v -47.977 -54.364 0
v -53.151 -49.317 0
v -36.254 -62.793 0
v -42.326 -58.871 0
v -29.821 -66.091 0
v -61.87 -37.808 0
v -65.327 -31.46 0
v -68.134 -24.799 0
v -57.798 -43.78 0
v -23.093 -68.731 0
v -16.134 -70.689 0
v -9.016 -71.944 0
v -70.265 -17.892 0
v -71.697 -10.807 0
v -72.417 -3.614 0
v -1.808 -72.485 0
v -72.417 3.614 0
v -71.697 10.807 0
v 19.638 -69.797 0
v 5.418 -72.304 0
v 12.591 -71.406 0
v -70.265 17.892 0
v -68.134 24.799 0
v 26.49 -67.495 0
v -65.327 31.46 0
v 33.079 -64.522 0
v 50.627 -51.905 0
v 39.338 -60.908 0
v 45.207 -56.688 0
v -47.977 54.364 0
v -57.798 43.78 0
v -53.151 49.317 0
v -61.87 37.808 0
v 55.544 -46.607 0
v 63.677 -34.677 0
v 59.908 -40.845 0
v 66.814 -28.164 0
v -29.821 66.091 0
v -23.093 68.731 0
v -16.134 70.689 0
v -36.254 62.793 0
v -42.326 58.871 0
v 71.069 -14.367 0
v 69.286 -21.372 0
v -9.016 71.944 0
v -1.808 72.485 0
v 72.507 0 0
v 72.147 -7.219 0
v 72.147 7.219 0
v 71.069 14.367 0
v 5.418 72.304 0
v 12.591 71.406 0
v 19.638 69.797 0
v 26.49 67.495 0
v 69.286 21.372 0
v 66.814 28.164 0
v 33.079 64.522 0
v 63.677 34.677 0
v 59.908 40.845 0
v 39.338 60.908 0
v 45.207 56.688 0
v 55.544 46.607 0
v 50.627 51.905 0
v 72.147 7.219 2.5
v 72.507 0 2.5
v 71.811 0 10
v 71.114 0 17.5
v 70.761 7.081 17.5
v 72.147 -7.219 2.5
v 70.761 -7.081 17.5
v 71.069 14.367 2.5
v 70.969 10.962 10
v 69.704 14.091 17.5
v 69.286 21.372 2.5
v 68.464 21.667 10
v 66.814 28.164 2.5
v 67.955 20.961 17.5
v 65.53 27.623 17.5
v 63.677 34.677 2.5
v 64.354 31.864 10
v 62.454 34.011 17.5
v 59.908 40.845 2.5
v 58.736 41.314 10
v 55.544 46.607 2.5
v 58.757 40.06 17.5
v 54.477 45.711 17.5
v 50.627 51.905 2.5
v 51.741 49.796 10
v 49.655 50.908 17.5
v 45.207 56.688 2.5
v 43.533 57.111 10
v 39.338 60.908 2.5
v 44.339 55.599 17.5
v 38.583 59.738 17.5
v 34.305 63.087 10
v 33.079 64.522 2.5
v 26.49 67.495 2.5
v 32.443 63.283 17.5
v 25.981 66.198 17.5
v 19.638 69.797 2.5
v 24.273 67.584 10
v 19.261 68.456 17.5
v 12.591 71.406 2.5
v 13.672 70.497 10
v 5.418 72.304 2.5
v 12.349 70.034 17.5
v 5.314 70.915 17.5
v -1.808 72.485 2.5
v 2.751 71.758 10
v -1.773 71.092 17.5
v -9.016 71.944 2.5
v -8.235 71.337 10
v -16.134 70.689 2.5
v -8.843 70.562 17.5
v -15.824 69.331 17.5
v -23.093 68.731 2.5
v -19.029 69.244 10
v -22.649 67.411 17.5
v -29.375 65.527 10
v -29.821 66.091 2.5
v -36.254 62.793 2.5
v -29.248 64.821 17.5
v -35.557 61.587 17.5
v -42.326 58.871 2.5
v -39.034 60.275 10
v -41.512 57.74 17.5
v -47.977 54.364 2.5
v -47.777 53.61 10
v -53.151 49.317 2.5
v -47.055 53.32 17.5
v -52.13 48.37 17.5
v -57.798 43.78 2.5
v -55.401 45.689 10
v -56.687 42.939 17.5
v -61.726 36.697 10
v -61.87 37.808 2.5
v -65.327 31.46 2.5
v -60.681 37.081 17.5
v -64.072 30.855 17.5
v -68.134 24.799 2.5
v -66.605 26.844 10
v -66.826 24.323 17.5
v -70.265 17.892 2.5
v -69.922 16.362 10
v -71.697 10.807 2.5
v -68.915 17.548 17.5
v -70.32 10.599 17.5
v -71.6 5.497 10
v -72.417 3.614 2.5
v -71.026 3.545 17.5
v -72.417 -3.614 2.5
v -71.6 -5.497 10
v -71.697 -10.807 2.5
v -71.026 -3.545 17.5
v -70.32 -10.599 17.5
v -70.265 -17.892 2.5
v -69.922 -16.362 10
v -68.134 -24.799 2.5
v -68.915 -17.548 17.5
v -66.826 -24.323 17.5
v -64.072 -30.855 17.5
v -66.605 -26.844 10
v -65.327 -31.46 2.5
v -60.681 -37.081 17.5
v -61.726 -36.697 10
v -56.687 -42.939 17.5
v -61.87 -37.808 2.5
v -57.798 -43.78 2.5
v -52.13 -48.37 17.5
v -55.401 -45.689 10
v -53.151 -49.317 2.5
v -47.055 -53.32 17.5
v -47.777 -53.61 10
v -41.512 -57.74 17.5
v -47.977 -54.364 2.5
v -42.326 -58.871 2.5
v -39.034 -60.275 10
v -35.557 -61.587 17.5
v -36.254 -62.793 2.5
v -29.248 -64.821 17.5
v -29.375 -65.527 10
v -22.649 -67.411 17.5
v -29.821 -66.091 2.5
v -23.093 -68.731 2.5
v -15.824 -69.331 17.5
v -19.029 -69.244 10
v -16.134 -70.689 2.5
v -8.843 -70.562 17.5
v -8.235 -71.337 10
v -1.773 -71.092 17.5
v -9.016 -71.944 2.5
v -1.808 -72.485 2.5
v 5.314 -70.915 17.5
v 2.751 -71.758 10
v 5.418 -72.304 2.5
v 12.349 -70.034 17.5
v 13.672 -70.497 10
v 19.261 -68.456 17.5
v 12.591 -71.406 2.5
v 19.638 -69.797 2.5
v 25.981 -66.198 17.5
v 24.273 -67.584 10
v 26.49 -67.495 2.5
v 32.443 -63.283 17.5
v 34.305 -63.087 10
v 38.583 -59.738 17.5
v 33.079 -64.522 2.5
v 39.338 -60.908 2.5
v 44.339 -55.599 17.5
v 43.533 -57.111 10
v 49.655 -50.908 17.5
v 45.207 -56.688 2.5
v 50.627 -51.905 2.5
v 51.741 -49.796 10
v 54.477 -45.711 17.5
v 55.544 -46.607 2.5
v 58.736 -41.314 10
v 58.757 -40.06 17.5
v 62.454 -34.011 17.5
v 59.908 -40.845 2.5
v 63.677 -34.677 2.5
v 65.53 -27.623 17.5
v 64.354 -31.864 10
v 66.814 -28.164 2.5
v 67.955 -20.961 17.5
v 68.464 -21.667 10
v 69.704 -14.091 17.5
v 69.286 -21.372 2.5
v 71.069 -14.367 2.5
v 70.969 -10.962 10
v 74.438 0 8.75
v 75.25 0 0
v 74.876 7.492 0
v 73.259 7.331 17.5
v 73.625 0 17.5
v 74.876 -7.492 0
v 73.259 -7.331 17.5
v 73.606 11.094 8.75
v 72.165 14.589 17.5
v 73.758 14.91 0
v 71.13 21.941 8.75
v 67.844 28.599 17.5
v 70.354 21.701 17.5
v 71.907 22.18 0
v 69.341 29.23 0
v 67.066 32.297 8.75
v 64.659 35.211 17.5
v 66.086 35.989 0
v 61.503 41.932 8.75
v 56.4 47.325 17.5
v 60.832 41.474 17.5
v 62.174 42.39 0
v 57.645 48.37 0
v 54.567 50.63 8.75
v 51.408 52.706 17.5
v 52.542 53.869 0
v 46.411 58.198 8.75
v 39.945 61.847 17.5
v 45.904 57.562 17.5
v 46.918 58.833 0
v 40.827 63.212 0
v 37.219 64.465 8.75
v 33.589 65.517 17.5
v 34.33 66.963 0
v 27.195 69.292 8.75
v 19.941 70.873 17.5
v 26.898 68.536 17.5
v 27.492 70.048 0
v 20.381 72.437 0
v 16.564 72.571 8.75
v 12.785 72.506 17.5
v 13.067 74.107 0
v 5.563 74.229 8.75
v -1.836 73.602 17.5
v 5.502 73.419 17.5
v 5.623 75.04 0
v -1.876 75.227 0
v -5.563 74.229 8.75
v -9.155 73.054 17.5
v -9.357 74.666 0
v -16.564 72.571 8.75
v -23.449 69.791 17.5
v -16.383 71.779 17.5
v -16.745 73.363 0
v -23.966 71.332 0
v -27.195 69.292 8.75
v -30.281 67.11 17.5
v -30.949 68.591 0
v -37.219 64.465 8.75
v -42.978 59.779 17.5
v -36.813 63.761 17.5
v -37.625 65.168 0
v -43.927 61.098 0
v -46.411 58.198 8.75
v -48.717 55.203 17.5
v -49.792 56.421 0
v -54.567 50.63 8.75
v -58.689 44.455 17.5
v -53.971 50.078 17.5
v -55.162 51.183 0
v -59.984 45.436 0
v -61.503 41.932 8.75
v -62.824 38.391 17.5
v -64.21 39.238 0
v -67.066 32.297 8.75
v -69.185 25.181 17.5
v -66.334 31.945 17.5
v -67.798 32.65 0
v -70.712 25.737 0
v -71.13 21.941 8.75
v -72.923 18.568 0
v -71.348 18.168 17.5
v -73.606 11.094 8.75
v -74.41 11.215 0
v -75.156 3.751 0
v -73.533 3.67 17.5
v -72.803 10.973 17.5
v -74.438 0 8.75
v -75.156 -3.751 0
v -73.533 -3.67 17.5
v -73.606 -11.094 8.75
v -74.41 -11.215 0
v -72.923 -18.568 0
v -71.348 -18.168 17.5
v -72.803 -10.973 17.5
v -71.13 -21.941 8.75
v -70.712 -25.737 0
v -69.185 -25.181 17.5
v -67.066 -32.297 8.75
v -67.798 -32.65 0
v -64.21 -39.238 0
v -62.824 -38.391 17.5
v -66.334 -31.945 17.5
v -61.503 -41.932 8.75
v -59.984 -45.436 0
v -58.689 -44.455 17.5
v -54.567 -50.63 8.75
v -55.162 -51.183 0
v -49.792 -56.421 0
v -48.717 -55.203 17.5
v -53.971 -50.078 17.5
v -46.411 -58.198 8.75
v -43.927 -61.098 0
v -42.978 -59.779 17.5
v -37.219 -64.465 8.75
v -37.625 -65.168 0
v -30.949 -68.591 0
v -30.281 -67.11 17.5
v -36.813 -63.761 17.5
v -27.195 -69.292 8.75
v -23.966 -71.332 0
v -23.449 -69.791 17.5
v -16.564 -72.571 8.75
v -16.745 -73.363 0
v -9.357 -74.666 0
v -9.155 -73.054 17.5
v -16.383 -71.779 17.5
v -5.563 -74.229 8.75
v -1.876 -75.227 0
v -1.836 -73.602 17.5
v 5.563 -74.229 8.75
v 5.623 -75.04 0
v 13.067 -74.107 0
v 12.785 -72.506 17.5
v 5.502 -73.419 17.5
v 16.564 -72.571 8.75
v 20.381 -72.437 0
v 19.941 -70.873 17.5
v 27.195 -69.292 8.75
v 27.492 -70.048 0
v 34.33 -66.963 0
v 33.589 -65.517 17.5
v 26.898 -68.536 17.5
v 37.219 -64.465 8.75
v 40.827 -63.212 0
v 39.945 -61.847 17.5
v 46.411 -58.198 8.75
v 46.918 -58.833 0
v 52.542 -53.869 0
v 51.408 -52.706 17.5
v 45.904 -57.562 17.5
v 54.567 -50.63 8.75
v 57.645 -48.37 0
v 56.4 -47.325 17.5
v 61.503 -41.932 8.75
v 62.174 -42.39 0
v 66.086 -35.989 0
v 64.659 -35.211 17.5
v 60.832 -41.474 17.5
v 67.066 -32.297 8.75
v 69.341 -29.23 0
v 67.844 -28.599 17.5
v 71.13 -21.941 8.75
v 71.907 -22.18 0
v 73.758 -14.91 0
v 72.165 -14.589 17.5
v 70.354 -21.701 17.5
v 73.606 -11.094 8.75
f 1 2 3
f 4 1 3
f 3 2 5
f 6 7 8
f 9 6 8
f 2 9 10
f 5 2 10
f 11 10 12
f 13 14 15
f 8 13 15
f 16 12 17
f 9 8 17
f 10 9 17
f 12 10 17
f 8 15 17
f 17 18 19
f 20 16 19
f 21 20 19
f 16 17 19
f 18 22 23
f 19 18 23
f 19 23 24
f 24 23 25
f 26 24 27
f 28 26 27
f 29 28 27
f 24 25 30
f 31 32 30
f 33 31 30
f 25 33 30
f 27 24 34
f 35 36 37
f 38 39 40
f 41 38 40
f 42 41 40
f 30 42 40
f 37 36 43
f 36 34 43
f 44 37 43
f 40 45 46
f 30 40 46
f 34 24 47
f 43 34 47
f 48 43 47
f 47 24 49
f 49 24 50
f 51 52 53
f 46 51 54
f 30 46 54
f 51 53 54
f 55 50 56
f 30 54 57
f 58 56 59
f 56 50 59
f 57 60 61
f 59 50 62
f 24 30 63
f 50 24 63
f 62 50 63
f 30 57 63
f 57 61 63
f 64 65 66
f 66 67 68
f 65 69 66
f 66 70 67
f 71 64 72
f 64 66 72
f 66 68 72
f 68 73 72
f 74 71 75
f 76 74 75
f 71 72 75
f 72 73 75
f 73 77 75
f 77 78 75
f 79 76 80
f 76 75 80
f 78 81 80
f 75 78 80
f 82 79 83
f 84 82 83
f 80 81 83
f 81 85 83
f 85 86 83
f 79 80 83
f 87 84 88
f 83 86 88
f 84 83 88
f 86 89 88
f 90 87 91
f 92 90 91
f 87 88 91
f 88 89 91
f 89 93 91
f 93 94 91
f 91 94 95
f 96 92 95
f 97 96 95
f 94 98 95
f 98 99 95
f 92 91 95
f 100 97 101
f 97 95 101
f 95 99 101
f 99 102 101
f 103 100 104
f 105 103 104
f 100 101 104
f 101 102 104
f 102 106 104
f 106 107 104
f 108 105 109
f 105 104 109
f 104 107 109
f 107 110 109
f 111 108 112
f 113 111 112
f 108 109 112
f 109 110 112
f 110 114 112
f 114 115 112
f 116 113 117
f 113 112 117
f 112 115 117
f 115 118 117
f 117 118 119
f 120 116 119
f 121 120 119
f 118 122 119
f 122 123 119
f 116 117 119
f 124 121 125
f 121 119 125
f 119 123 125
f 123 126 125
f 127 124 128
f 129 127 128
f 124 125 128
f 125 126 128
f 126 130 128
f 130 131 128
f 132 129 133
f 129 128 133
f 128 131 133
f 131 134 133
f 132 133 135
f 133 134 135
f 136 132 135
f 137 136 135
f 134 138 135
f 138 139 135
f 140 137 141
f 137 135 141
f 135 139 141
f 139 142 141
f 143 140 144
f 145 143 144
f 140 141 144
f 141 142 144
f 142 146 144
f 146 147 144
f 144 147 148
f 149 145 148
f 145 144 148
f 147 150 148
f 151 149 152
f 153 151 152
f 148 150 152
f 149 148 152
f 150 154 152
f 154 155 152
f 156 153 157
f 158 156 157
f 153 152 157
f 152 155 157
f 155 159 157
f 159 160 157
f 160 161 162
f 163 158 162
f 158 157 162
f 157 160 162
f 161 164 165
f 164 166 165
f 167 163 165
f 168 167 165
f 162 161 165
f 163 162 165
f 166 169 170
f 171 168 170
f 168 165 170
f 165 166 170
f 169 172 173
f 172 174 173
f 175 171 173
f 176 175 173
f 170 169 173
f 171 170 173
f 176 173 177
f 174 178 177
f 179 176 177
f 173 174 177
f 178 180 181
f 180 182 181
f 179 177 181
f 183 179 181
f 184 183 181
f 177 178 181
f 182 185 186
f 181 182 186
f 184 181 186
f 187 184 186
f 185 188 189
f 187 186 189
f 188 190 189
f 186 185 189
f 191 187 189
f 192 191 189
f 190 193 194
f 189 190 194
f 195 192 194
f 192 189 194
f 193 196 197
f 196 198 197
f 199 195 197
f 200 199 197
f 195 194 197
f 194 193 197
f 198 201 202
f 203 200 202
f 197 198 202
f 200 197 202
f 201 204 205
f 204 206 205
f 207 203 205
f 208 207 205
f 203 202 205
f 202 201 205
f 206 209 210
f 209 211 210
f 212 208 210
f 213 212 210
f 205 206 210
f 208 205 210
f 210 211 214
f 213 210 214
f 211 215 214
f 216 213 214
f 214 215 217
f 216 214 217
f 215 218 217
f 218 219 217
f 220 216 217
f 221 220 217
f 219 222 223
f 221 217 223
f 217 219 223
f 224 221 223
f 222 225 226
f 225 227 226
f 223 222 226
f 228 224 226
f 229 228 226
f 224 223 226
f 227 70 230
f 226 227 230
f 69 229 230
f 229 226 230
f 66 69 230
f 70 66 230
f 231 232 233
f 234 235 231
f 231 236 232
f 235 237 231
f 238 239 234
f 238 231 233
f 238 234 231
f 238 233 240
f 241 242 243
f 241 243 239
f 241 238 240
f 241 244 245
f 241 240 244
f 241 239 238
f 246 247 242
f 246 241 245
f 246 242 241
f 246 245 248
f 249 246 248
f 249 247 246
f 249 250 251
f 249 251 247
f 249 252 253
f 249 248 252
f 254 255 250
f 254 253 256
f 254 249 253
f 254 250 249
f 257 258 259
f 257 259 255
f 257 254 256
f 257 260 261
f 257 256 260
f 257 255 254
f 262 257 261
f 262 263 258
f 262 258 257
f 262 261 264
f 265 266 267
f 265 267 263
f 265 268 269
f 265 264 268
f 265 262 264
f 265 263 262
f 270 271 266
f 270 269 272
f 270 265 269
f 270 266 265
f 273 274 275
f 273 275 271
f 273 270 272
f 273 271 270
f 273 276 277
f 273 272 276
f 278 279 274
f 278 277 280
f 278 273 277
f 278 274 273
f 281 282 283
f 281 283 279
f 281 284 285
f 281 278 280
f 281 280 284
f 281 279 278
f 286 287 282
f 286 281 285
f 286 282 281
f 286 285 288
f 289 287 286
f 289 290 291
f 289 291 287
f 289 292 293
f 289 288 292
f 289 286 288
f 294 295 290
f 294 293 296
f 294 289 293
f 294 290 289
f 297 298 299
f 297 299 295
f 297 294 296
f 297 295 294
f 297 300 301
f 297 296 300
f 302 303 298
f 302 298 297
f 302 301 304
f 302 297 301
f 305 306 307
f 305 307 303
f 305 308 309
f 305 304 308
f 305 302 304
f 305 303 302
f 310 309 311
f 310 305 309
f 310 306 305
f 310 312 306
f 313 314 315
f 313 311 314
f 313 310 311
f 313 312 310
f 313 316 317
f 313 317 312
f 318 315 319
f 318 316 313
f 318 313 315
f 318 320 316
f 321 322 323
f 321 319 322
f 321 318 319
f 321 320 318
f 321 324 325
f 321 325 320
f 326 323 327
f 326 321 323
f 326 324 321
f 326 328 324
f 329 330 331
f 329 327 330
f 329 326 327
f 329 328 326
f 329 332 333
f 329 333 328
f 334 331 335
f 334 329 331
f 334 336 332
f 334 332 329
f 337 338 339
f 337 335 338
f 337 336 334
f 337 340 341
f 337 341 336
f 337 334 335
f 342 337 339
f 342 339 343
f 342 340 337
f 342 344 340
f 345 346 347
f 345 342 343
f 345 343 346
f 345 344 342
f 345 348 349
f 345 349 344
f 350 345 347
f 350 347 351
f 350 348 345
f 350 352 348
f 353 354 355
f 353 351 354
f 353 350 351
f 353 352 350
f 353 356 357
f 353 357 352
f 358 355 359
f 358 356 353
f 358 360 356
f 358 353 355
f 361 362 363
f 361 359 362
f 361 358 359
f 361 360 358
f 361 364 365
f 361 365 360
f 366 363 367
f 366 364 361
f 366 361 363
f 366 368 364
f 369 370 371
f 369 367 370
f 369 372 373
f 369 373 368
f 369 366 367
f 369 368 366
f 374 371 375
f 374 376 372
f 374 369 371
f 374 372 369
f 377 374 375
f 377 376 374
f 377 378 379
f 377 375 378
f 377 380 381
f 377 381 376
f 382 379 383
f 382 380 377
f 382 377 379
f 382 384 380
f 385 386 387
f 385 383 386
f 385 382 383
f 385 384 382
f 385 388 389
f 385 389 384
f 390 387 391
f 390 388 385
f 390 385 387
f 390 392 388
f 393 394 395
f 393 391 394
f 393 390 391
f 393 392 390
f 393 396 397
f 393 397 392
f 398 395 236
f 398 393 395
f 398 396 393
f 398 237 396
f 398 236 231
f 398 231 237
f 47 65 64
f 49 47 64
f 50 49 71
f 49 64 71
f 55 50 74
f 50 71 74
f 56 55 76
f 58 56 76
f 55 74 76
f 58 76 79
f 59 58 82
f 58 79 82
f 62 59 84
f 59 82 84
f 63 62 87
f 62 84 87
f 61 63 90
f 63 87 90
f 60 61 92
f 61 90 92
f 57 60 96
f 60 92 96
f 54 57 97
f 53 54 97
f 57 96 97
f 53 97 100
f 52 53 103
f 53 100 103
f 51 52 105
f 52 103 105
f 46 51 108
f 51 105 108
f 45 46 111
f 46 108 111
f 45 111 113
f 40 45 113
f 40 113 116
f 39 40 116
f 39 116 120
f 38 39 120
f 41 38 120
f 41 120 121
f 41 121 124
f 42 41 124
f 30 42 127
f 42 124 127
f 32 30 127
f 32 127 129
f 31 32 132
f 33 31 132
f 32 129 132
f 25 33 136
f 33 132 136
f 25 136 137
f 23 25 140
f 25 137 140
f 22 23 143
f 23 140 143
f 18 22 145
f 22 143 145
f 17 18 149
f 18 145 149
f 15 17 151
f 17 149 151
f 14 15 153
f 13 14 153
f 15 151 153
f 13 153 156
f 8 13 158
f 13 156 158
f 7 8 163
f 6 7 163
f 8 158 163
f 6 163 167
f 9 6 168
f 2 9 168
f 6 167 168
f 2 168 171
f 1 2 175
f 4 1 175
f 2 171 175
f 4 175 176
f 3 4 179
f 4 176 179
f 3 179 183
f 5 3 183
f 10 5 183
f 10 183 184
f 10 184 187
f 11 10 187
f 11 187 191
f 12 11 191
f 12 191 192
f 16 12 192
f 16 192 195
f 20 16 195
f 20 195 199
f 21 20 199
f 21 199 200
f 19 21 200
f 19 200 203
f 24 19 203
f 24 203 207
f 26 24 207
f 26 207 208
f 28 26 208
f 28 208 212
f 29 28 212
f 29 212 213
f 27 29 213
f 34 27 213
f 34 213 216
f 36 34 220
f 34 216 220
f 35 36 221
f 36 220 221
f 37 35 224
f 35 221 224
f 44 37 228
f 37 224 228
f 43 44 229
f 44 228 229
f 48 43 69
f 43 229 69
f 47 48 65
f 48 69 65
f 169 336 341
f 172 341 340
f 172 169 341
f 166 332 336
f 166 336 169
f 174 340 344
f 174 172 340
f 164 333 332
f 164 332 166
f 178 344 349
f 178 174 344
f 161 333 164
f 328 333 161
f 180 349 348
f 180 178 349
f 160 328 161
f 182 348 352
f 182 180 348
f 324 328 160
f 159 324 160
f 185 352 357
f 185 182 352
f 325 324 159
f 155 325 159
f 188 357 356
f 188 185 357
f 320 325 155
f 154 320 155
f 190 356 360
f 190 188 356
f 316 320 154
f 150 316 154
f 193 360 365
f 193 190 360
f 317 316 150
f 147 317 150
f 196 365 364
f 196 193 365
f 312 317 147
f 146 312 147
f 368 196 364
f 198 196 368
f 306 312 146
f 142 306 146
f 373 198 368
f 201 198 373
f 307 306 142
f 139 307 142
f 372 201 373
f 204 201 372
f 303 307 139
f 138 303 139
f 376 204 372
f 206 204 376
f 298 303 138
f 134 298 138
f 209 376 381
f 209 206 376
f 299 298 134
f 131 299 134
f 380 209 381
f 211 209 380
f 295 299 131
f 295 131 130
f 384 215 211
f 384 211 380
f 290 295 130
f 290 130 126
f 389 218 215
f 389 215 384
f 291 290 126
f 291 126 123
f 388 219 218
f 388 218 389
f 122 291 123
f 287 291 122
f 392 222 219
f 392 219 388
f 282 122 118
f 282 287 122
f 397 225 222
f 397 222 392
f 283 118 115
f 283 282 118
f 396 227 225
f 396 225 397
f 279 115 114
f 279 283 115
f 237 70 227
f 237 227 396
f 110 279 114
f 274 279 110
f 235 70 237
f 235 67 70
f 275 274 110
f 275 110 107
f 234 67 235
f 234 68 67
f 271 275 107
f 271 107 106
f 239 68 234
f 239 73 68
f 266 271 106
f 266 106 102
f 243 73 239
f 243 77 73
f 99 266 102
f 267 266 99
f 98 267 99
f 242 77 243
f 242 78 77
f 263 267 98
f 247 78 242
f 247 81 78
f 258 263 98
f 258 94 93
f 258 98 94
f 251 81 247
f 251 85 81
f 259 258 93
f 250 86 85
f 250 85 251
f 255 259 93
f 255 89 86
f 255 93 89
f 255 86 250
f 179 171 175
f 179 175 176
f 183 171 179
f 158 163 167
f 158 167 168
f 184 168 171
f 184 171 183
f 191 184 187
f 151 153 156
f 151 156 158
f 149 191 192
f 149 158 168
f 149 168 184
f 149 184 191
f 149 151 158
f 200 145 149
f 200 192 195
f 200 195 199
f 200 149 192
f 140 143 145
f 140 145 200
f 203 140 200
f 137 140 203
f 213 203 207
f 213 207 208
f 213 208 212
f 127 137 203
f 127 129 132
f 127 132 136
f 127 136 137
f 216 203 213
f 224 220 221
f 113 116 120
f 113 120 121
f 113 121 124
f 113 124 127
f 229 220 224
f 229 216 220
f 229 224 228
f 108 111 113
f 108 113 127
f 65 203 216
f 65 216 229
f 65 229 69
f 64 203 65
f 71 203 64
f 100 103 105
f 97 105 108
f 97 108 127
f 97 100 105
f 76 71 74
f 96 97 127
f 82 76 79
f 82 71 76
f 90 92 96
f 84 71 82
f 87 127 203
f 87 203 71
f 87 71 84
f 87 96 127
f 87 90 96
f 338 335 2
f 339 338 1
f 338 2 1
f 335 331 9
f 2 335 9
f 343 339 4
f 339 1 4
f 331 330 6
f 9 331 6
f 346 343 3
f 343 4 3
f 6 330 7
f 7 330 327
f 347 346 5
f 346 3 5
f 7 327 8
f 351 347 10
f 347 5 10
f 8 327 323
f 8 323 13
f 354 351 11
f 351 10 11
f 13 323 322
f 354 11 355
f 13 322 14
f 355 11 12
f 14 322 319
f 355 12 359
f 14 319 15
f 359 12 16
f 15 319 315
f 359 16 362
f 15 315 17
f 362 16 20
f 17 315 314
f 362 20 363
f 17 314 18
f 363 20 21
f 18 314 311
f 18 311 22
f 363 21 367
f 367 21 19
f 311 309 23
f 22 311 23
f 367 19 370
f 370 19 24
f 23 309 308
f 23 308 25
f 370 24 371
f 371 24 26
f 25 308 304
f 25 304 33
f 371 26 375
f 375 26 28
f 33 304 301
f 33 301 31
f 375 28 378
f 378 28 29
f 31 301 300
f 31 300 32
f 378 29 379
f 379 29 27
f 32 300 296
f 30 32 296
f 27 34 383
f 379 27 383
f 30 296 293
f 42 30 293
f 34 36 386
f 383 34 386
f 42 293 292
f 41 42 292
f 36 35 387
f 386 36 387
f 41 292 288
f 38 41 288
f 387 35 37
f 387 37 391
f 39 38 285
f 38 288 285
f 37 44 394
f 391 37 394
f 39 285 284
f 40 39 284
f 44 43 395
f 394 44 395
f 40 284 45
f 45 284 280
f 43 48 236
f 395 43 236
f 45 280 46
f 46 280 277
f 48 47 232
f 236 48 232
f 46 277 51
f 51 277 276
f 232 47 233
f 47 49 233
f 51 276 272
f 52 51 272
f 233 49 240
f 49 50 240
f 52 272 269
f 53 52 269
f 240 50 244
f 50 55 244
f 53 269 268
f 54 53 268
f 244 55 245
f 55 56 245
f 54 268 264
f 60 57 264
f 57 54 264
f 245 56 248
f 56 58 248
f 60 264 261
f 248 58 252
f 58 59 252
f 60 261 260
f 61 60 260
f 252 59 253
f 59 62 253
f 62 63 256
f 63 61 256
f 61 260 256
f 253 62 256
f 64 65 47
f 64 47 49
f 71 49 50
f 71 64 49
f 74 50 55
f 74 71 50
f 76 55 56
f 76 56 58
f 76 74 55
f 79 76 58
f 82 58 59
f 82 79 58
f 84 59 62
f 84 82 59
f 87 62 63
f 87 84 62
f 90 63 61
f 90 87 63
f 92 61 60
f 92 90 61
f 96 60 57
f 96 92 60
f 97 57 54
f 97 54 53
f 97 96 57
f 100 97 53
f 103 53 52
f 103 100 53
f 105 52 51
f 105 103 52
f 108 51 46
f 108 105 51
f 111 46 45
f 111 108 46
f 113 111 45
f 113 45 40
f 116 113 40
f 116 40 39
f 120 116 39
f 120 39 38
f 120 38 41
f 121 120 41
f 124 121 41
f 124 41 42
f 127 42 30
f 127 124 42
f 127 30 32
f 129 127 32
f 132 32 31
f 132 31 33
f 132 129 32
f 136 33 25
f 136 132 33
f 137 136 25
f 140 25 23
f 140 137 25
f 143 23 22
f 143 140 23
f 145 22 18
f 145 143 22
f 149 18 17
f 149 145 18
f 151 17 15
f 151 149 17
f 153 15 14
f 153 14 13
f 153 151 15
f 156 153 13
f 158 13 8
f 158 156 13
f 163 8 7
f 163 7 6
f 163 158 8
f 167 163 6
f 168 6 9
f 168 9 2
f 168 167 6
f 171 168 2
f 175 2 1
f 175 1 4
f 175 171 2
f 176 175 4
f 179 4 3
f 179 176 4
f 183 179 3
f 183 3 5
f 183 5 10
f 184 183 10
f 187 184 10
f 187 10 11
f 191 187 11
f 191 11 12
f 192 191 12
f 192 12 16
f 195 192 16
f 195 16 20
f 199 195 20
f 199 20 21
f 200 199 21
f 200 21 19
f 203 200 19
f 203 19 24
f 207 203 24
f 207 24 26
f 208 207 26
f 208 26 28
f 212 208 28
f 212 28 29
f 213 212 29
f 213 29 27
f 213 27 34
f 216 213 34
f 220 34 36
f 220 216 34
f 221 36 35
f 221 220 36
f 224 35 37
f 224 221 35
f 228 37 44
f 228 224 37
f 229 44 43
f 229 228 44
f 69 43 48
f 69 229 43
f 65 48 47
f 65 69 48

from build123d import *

# Parameters (mm, degrees)
F8_R      = 75.25
F9_DEPTH  = 17.5
F9_TAPER  = 5.3051096062
F10_T     = -2.5
F11_R     = 72.5071022153
F12_DEPTH = 2.5
F13_DEPTH = 2.5


with BuildPart() as f9:
    # F8 (on Top) → F9 (new body)
    with BuildSketch(Plane.XY):
        Circle(F8_R)
    extrude(amount=F9_DEPTH, taper=F9_TAPER)

    # F10
    f10_openings = [f9.faces().sort_by_distance(p)[0] for p in [
        (0, 0, 17.5),
    ]]
    offset(amount=F10_T, openings=f10_openings)

    # F11 (on face) → F12 (cut, through all)
    with BuildSketch(Plane.XY.offset(2.5)):
        Circle(F11_R)
    extrude(amount=-F12_DEPTH, mode=Mode.SUBTRACT)


with BuildPart() as f13:
    # F11 (on face) → F13 (new body, through all)
    with BuildSketch(Plane.XY.offset(2.5)):
        Circle(F11_R)
    extrude(amount=-F13_DEPTH)


solid = Compound([f9.part, f13.part])
